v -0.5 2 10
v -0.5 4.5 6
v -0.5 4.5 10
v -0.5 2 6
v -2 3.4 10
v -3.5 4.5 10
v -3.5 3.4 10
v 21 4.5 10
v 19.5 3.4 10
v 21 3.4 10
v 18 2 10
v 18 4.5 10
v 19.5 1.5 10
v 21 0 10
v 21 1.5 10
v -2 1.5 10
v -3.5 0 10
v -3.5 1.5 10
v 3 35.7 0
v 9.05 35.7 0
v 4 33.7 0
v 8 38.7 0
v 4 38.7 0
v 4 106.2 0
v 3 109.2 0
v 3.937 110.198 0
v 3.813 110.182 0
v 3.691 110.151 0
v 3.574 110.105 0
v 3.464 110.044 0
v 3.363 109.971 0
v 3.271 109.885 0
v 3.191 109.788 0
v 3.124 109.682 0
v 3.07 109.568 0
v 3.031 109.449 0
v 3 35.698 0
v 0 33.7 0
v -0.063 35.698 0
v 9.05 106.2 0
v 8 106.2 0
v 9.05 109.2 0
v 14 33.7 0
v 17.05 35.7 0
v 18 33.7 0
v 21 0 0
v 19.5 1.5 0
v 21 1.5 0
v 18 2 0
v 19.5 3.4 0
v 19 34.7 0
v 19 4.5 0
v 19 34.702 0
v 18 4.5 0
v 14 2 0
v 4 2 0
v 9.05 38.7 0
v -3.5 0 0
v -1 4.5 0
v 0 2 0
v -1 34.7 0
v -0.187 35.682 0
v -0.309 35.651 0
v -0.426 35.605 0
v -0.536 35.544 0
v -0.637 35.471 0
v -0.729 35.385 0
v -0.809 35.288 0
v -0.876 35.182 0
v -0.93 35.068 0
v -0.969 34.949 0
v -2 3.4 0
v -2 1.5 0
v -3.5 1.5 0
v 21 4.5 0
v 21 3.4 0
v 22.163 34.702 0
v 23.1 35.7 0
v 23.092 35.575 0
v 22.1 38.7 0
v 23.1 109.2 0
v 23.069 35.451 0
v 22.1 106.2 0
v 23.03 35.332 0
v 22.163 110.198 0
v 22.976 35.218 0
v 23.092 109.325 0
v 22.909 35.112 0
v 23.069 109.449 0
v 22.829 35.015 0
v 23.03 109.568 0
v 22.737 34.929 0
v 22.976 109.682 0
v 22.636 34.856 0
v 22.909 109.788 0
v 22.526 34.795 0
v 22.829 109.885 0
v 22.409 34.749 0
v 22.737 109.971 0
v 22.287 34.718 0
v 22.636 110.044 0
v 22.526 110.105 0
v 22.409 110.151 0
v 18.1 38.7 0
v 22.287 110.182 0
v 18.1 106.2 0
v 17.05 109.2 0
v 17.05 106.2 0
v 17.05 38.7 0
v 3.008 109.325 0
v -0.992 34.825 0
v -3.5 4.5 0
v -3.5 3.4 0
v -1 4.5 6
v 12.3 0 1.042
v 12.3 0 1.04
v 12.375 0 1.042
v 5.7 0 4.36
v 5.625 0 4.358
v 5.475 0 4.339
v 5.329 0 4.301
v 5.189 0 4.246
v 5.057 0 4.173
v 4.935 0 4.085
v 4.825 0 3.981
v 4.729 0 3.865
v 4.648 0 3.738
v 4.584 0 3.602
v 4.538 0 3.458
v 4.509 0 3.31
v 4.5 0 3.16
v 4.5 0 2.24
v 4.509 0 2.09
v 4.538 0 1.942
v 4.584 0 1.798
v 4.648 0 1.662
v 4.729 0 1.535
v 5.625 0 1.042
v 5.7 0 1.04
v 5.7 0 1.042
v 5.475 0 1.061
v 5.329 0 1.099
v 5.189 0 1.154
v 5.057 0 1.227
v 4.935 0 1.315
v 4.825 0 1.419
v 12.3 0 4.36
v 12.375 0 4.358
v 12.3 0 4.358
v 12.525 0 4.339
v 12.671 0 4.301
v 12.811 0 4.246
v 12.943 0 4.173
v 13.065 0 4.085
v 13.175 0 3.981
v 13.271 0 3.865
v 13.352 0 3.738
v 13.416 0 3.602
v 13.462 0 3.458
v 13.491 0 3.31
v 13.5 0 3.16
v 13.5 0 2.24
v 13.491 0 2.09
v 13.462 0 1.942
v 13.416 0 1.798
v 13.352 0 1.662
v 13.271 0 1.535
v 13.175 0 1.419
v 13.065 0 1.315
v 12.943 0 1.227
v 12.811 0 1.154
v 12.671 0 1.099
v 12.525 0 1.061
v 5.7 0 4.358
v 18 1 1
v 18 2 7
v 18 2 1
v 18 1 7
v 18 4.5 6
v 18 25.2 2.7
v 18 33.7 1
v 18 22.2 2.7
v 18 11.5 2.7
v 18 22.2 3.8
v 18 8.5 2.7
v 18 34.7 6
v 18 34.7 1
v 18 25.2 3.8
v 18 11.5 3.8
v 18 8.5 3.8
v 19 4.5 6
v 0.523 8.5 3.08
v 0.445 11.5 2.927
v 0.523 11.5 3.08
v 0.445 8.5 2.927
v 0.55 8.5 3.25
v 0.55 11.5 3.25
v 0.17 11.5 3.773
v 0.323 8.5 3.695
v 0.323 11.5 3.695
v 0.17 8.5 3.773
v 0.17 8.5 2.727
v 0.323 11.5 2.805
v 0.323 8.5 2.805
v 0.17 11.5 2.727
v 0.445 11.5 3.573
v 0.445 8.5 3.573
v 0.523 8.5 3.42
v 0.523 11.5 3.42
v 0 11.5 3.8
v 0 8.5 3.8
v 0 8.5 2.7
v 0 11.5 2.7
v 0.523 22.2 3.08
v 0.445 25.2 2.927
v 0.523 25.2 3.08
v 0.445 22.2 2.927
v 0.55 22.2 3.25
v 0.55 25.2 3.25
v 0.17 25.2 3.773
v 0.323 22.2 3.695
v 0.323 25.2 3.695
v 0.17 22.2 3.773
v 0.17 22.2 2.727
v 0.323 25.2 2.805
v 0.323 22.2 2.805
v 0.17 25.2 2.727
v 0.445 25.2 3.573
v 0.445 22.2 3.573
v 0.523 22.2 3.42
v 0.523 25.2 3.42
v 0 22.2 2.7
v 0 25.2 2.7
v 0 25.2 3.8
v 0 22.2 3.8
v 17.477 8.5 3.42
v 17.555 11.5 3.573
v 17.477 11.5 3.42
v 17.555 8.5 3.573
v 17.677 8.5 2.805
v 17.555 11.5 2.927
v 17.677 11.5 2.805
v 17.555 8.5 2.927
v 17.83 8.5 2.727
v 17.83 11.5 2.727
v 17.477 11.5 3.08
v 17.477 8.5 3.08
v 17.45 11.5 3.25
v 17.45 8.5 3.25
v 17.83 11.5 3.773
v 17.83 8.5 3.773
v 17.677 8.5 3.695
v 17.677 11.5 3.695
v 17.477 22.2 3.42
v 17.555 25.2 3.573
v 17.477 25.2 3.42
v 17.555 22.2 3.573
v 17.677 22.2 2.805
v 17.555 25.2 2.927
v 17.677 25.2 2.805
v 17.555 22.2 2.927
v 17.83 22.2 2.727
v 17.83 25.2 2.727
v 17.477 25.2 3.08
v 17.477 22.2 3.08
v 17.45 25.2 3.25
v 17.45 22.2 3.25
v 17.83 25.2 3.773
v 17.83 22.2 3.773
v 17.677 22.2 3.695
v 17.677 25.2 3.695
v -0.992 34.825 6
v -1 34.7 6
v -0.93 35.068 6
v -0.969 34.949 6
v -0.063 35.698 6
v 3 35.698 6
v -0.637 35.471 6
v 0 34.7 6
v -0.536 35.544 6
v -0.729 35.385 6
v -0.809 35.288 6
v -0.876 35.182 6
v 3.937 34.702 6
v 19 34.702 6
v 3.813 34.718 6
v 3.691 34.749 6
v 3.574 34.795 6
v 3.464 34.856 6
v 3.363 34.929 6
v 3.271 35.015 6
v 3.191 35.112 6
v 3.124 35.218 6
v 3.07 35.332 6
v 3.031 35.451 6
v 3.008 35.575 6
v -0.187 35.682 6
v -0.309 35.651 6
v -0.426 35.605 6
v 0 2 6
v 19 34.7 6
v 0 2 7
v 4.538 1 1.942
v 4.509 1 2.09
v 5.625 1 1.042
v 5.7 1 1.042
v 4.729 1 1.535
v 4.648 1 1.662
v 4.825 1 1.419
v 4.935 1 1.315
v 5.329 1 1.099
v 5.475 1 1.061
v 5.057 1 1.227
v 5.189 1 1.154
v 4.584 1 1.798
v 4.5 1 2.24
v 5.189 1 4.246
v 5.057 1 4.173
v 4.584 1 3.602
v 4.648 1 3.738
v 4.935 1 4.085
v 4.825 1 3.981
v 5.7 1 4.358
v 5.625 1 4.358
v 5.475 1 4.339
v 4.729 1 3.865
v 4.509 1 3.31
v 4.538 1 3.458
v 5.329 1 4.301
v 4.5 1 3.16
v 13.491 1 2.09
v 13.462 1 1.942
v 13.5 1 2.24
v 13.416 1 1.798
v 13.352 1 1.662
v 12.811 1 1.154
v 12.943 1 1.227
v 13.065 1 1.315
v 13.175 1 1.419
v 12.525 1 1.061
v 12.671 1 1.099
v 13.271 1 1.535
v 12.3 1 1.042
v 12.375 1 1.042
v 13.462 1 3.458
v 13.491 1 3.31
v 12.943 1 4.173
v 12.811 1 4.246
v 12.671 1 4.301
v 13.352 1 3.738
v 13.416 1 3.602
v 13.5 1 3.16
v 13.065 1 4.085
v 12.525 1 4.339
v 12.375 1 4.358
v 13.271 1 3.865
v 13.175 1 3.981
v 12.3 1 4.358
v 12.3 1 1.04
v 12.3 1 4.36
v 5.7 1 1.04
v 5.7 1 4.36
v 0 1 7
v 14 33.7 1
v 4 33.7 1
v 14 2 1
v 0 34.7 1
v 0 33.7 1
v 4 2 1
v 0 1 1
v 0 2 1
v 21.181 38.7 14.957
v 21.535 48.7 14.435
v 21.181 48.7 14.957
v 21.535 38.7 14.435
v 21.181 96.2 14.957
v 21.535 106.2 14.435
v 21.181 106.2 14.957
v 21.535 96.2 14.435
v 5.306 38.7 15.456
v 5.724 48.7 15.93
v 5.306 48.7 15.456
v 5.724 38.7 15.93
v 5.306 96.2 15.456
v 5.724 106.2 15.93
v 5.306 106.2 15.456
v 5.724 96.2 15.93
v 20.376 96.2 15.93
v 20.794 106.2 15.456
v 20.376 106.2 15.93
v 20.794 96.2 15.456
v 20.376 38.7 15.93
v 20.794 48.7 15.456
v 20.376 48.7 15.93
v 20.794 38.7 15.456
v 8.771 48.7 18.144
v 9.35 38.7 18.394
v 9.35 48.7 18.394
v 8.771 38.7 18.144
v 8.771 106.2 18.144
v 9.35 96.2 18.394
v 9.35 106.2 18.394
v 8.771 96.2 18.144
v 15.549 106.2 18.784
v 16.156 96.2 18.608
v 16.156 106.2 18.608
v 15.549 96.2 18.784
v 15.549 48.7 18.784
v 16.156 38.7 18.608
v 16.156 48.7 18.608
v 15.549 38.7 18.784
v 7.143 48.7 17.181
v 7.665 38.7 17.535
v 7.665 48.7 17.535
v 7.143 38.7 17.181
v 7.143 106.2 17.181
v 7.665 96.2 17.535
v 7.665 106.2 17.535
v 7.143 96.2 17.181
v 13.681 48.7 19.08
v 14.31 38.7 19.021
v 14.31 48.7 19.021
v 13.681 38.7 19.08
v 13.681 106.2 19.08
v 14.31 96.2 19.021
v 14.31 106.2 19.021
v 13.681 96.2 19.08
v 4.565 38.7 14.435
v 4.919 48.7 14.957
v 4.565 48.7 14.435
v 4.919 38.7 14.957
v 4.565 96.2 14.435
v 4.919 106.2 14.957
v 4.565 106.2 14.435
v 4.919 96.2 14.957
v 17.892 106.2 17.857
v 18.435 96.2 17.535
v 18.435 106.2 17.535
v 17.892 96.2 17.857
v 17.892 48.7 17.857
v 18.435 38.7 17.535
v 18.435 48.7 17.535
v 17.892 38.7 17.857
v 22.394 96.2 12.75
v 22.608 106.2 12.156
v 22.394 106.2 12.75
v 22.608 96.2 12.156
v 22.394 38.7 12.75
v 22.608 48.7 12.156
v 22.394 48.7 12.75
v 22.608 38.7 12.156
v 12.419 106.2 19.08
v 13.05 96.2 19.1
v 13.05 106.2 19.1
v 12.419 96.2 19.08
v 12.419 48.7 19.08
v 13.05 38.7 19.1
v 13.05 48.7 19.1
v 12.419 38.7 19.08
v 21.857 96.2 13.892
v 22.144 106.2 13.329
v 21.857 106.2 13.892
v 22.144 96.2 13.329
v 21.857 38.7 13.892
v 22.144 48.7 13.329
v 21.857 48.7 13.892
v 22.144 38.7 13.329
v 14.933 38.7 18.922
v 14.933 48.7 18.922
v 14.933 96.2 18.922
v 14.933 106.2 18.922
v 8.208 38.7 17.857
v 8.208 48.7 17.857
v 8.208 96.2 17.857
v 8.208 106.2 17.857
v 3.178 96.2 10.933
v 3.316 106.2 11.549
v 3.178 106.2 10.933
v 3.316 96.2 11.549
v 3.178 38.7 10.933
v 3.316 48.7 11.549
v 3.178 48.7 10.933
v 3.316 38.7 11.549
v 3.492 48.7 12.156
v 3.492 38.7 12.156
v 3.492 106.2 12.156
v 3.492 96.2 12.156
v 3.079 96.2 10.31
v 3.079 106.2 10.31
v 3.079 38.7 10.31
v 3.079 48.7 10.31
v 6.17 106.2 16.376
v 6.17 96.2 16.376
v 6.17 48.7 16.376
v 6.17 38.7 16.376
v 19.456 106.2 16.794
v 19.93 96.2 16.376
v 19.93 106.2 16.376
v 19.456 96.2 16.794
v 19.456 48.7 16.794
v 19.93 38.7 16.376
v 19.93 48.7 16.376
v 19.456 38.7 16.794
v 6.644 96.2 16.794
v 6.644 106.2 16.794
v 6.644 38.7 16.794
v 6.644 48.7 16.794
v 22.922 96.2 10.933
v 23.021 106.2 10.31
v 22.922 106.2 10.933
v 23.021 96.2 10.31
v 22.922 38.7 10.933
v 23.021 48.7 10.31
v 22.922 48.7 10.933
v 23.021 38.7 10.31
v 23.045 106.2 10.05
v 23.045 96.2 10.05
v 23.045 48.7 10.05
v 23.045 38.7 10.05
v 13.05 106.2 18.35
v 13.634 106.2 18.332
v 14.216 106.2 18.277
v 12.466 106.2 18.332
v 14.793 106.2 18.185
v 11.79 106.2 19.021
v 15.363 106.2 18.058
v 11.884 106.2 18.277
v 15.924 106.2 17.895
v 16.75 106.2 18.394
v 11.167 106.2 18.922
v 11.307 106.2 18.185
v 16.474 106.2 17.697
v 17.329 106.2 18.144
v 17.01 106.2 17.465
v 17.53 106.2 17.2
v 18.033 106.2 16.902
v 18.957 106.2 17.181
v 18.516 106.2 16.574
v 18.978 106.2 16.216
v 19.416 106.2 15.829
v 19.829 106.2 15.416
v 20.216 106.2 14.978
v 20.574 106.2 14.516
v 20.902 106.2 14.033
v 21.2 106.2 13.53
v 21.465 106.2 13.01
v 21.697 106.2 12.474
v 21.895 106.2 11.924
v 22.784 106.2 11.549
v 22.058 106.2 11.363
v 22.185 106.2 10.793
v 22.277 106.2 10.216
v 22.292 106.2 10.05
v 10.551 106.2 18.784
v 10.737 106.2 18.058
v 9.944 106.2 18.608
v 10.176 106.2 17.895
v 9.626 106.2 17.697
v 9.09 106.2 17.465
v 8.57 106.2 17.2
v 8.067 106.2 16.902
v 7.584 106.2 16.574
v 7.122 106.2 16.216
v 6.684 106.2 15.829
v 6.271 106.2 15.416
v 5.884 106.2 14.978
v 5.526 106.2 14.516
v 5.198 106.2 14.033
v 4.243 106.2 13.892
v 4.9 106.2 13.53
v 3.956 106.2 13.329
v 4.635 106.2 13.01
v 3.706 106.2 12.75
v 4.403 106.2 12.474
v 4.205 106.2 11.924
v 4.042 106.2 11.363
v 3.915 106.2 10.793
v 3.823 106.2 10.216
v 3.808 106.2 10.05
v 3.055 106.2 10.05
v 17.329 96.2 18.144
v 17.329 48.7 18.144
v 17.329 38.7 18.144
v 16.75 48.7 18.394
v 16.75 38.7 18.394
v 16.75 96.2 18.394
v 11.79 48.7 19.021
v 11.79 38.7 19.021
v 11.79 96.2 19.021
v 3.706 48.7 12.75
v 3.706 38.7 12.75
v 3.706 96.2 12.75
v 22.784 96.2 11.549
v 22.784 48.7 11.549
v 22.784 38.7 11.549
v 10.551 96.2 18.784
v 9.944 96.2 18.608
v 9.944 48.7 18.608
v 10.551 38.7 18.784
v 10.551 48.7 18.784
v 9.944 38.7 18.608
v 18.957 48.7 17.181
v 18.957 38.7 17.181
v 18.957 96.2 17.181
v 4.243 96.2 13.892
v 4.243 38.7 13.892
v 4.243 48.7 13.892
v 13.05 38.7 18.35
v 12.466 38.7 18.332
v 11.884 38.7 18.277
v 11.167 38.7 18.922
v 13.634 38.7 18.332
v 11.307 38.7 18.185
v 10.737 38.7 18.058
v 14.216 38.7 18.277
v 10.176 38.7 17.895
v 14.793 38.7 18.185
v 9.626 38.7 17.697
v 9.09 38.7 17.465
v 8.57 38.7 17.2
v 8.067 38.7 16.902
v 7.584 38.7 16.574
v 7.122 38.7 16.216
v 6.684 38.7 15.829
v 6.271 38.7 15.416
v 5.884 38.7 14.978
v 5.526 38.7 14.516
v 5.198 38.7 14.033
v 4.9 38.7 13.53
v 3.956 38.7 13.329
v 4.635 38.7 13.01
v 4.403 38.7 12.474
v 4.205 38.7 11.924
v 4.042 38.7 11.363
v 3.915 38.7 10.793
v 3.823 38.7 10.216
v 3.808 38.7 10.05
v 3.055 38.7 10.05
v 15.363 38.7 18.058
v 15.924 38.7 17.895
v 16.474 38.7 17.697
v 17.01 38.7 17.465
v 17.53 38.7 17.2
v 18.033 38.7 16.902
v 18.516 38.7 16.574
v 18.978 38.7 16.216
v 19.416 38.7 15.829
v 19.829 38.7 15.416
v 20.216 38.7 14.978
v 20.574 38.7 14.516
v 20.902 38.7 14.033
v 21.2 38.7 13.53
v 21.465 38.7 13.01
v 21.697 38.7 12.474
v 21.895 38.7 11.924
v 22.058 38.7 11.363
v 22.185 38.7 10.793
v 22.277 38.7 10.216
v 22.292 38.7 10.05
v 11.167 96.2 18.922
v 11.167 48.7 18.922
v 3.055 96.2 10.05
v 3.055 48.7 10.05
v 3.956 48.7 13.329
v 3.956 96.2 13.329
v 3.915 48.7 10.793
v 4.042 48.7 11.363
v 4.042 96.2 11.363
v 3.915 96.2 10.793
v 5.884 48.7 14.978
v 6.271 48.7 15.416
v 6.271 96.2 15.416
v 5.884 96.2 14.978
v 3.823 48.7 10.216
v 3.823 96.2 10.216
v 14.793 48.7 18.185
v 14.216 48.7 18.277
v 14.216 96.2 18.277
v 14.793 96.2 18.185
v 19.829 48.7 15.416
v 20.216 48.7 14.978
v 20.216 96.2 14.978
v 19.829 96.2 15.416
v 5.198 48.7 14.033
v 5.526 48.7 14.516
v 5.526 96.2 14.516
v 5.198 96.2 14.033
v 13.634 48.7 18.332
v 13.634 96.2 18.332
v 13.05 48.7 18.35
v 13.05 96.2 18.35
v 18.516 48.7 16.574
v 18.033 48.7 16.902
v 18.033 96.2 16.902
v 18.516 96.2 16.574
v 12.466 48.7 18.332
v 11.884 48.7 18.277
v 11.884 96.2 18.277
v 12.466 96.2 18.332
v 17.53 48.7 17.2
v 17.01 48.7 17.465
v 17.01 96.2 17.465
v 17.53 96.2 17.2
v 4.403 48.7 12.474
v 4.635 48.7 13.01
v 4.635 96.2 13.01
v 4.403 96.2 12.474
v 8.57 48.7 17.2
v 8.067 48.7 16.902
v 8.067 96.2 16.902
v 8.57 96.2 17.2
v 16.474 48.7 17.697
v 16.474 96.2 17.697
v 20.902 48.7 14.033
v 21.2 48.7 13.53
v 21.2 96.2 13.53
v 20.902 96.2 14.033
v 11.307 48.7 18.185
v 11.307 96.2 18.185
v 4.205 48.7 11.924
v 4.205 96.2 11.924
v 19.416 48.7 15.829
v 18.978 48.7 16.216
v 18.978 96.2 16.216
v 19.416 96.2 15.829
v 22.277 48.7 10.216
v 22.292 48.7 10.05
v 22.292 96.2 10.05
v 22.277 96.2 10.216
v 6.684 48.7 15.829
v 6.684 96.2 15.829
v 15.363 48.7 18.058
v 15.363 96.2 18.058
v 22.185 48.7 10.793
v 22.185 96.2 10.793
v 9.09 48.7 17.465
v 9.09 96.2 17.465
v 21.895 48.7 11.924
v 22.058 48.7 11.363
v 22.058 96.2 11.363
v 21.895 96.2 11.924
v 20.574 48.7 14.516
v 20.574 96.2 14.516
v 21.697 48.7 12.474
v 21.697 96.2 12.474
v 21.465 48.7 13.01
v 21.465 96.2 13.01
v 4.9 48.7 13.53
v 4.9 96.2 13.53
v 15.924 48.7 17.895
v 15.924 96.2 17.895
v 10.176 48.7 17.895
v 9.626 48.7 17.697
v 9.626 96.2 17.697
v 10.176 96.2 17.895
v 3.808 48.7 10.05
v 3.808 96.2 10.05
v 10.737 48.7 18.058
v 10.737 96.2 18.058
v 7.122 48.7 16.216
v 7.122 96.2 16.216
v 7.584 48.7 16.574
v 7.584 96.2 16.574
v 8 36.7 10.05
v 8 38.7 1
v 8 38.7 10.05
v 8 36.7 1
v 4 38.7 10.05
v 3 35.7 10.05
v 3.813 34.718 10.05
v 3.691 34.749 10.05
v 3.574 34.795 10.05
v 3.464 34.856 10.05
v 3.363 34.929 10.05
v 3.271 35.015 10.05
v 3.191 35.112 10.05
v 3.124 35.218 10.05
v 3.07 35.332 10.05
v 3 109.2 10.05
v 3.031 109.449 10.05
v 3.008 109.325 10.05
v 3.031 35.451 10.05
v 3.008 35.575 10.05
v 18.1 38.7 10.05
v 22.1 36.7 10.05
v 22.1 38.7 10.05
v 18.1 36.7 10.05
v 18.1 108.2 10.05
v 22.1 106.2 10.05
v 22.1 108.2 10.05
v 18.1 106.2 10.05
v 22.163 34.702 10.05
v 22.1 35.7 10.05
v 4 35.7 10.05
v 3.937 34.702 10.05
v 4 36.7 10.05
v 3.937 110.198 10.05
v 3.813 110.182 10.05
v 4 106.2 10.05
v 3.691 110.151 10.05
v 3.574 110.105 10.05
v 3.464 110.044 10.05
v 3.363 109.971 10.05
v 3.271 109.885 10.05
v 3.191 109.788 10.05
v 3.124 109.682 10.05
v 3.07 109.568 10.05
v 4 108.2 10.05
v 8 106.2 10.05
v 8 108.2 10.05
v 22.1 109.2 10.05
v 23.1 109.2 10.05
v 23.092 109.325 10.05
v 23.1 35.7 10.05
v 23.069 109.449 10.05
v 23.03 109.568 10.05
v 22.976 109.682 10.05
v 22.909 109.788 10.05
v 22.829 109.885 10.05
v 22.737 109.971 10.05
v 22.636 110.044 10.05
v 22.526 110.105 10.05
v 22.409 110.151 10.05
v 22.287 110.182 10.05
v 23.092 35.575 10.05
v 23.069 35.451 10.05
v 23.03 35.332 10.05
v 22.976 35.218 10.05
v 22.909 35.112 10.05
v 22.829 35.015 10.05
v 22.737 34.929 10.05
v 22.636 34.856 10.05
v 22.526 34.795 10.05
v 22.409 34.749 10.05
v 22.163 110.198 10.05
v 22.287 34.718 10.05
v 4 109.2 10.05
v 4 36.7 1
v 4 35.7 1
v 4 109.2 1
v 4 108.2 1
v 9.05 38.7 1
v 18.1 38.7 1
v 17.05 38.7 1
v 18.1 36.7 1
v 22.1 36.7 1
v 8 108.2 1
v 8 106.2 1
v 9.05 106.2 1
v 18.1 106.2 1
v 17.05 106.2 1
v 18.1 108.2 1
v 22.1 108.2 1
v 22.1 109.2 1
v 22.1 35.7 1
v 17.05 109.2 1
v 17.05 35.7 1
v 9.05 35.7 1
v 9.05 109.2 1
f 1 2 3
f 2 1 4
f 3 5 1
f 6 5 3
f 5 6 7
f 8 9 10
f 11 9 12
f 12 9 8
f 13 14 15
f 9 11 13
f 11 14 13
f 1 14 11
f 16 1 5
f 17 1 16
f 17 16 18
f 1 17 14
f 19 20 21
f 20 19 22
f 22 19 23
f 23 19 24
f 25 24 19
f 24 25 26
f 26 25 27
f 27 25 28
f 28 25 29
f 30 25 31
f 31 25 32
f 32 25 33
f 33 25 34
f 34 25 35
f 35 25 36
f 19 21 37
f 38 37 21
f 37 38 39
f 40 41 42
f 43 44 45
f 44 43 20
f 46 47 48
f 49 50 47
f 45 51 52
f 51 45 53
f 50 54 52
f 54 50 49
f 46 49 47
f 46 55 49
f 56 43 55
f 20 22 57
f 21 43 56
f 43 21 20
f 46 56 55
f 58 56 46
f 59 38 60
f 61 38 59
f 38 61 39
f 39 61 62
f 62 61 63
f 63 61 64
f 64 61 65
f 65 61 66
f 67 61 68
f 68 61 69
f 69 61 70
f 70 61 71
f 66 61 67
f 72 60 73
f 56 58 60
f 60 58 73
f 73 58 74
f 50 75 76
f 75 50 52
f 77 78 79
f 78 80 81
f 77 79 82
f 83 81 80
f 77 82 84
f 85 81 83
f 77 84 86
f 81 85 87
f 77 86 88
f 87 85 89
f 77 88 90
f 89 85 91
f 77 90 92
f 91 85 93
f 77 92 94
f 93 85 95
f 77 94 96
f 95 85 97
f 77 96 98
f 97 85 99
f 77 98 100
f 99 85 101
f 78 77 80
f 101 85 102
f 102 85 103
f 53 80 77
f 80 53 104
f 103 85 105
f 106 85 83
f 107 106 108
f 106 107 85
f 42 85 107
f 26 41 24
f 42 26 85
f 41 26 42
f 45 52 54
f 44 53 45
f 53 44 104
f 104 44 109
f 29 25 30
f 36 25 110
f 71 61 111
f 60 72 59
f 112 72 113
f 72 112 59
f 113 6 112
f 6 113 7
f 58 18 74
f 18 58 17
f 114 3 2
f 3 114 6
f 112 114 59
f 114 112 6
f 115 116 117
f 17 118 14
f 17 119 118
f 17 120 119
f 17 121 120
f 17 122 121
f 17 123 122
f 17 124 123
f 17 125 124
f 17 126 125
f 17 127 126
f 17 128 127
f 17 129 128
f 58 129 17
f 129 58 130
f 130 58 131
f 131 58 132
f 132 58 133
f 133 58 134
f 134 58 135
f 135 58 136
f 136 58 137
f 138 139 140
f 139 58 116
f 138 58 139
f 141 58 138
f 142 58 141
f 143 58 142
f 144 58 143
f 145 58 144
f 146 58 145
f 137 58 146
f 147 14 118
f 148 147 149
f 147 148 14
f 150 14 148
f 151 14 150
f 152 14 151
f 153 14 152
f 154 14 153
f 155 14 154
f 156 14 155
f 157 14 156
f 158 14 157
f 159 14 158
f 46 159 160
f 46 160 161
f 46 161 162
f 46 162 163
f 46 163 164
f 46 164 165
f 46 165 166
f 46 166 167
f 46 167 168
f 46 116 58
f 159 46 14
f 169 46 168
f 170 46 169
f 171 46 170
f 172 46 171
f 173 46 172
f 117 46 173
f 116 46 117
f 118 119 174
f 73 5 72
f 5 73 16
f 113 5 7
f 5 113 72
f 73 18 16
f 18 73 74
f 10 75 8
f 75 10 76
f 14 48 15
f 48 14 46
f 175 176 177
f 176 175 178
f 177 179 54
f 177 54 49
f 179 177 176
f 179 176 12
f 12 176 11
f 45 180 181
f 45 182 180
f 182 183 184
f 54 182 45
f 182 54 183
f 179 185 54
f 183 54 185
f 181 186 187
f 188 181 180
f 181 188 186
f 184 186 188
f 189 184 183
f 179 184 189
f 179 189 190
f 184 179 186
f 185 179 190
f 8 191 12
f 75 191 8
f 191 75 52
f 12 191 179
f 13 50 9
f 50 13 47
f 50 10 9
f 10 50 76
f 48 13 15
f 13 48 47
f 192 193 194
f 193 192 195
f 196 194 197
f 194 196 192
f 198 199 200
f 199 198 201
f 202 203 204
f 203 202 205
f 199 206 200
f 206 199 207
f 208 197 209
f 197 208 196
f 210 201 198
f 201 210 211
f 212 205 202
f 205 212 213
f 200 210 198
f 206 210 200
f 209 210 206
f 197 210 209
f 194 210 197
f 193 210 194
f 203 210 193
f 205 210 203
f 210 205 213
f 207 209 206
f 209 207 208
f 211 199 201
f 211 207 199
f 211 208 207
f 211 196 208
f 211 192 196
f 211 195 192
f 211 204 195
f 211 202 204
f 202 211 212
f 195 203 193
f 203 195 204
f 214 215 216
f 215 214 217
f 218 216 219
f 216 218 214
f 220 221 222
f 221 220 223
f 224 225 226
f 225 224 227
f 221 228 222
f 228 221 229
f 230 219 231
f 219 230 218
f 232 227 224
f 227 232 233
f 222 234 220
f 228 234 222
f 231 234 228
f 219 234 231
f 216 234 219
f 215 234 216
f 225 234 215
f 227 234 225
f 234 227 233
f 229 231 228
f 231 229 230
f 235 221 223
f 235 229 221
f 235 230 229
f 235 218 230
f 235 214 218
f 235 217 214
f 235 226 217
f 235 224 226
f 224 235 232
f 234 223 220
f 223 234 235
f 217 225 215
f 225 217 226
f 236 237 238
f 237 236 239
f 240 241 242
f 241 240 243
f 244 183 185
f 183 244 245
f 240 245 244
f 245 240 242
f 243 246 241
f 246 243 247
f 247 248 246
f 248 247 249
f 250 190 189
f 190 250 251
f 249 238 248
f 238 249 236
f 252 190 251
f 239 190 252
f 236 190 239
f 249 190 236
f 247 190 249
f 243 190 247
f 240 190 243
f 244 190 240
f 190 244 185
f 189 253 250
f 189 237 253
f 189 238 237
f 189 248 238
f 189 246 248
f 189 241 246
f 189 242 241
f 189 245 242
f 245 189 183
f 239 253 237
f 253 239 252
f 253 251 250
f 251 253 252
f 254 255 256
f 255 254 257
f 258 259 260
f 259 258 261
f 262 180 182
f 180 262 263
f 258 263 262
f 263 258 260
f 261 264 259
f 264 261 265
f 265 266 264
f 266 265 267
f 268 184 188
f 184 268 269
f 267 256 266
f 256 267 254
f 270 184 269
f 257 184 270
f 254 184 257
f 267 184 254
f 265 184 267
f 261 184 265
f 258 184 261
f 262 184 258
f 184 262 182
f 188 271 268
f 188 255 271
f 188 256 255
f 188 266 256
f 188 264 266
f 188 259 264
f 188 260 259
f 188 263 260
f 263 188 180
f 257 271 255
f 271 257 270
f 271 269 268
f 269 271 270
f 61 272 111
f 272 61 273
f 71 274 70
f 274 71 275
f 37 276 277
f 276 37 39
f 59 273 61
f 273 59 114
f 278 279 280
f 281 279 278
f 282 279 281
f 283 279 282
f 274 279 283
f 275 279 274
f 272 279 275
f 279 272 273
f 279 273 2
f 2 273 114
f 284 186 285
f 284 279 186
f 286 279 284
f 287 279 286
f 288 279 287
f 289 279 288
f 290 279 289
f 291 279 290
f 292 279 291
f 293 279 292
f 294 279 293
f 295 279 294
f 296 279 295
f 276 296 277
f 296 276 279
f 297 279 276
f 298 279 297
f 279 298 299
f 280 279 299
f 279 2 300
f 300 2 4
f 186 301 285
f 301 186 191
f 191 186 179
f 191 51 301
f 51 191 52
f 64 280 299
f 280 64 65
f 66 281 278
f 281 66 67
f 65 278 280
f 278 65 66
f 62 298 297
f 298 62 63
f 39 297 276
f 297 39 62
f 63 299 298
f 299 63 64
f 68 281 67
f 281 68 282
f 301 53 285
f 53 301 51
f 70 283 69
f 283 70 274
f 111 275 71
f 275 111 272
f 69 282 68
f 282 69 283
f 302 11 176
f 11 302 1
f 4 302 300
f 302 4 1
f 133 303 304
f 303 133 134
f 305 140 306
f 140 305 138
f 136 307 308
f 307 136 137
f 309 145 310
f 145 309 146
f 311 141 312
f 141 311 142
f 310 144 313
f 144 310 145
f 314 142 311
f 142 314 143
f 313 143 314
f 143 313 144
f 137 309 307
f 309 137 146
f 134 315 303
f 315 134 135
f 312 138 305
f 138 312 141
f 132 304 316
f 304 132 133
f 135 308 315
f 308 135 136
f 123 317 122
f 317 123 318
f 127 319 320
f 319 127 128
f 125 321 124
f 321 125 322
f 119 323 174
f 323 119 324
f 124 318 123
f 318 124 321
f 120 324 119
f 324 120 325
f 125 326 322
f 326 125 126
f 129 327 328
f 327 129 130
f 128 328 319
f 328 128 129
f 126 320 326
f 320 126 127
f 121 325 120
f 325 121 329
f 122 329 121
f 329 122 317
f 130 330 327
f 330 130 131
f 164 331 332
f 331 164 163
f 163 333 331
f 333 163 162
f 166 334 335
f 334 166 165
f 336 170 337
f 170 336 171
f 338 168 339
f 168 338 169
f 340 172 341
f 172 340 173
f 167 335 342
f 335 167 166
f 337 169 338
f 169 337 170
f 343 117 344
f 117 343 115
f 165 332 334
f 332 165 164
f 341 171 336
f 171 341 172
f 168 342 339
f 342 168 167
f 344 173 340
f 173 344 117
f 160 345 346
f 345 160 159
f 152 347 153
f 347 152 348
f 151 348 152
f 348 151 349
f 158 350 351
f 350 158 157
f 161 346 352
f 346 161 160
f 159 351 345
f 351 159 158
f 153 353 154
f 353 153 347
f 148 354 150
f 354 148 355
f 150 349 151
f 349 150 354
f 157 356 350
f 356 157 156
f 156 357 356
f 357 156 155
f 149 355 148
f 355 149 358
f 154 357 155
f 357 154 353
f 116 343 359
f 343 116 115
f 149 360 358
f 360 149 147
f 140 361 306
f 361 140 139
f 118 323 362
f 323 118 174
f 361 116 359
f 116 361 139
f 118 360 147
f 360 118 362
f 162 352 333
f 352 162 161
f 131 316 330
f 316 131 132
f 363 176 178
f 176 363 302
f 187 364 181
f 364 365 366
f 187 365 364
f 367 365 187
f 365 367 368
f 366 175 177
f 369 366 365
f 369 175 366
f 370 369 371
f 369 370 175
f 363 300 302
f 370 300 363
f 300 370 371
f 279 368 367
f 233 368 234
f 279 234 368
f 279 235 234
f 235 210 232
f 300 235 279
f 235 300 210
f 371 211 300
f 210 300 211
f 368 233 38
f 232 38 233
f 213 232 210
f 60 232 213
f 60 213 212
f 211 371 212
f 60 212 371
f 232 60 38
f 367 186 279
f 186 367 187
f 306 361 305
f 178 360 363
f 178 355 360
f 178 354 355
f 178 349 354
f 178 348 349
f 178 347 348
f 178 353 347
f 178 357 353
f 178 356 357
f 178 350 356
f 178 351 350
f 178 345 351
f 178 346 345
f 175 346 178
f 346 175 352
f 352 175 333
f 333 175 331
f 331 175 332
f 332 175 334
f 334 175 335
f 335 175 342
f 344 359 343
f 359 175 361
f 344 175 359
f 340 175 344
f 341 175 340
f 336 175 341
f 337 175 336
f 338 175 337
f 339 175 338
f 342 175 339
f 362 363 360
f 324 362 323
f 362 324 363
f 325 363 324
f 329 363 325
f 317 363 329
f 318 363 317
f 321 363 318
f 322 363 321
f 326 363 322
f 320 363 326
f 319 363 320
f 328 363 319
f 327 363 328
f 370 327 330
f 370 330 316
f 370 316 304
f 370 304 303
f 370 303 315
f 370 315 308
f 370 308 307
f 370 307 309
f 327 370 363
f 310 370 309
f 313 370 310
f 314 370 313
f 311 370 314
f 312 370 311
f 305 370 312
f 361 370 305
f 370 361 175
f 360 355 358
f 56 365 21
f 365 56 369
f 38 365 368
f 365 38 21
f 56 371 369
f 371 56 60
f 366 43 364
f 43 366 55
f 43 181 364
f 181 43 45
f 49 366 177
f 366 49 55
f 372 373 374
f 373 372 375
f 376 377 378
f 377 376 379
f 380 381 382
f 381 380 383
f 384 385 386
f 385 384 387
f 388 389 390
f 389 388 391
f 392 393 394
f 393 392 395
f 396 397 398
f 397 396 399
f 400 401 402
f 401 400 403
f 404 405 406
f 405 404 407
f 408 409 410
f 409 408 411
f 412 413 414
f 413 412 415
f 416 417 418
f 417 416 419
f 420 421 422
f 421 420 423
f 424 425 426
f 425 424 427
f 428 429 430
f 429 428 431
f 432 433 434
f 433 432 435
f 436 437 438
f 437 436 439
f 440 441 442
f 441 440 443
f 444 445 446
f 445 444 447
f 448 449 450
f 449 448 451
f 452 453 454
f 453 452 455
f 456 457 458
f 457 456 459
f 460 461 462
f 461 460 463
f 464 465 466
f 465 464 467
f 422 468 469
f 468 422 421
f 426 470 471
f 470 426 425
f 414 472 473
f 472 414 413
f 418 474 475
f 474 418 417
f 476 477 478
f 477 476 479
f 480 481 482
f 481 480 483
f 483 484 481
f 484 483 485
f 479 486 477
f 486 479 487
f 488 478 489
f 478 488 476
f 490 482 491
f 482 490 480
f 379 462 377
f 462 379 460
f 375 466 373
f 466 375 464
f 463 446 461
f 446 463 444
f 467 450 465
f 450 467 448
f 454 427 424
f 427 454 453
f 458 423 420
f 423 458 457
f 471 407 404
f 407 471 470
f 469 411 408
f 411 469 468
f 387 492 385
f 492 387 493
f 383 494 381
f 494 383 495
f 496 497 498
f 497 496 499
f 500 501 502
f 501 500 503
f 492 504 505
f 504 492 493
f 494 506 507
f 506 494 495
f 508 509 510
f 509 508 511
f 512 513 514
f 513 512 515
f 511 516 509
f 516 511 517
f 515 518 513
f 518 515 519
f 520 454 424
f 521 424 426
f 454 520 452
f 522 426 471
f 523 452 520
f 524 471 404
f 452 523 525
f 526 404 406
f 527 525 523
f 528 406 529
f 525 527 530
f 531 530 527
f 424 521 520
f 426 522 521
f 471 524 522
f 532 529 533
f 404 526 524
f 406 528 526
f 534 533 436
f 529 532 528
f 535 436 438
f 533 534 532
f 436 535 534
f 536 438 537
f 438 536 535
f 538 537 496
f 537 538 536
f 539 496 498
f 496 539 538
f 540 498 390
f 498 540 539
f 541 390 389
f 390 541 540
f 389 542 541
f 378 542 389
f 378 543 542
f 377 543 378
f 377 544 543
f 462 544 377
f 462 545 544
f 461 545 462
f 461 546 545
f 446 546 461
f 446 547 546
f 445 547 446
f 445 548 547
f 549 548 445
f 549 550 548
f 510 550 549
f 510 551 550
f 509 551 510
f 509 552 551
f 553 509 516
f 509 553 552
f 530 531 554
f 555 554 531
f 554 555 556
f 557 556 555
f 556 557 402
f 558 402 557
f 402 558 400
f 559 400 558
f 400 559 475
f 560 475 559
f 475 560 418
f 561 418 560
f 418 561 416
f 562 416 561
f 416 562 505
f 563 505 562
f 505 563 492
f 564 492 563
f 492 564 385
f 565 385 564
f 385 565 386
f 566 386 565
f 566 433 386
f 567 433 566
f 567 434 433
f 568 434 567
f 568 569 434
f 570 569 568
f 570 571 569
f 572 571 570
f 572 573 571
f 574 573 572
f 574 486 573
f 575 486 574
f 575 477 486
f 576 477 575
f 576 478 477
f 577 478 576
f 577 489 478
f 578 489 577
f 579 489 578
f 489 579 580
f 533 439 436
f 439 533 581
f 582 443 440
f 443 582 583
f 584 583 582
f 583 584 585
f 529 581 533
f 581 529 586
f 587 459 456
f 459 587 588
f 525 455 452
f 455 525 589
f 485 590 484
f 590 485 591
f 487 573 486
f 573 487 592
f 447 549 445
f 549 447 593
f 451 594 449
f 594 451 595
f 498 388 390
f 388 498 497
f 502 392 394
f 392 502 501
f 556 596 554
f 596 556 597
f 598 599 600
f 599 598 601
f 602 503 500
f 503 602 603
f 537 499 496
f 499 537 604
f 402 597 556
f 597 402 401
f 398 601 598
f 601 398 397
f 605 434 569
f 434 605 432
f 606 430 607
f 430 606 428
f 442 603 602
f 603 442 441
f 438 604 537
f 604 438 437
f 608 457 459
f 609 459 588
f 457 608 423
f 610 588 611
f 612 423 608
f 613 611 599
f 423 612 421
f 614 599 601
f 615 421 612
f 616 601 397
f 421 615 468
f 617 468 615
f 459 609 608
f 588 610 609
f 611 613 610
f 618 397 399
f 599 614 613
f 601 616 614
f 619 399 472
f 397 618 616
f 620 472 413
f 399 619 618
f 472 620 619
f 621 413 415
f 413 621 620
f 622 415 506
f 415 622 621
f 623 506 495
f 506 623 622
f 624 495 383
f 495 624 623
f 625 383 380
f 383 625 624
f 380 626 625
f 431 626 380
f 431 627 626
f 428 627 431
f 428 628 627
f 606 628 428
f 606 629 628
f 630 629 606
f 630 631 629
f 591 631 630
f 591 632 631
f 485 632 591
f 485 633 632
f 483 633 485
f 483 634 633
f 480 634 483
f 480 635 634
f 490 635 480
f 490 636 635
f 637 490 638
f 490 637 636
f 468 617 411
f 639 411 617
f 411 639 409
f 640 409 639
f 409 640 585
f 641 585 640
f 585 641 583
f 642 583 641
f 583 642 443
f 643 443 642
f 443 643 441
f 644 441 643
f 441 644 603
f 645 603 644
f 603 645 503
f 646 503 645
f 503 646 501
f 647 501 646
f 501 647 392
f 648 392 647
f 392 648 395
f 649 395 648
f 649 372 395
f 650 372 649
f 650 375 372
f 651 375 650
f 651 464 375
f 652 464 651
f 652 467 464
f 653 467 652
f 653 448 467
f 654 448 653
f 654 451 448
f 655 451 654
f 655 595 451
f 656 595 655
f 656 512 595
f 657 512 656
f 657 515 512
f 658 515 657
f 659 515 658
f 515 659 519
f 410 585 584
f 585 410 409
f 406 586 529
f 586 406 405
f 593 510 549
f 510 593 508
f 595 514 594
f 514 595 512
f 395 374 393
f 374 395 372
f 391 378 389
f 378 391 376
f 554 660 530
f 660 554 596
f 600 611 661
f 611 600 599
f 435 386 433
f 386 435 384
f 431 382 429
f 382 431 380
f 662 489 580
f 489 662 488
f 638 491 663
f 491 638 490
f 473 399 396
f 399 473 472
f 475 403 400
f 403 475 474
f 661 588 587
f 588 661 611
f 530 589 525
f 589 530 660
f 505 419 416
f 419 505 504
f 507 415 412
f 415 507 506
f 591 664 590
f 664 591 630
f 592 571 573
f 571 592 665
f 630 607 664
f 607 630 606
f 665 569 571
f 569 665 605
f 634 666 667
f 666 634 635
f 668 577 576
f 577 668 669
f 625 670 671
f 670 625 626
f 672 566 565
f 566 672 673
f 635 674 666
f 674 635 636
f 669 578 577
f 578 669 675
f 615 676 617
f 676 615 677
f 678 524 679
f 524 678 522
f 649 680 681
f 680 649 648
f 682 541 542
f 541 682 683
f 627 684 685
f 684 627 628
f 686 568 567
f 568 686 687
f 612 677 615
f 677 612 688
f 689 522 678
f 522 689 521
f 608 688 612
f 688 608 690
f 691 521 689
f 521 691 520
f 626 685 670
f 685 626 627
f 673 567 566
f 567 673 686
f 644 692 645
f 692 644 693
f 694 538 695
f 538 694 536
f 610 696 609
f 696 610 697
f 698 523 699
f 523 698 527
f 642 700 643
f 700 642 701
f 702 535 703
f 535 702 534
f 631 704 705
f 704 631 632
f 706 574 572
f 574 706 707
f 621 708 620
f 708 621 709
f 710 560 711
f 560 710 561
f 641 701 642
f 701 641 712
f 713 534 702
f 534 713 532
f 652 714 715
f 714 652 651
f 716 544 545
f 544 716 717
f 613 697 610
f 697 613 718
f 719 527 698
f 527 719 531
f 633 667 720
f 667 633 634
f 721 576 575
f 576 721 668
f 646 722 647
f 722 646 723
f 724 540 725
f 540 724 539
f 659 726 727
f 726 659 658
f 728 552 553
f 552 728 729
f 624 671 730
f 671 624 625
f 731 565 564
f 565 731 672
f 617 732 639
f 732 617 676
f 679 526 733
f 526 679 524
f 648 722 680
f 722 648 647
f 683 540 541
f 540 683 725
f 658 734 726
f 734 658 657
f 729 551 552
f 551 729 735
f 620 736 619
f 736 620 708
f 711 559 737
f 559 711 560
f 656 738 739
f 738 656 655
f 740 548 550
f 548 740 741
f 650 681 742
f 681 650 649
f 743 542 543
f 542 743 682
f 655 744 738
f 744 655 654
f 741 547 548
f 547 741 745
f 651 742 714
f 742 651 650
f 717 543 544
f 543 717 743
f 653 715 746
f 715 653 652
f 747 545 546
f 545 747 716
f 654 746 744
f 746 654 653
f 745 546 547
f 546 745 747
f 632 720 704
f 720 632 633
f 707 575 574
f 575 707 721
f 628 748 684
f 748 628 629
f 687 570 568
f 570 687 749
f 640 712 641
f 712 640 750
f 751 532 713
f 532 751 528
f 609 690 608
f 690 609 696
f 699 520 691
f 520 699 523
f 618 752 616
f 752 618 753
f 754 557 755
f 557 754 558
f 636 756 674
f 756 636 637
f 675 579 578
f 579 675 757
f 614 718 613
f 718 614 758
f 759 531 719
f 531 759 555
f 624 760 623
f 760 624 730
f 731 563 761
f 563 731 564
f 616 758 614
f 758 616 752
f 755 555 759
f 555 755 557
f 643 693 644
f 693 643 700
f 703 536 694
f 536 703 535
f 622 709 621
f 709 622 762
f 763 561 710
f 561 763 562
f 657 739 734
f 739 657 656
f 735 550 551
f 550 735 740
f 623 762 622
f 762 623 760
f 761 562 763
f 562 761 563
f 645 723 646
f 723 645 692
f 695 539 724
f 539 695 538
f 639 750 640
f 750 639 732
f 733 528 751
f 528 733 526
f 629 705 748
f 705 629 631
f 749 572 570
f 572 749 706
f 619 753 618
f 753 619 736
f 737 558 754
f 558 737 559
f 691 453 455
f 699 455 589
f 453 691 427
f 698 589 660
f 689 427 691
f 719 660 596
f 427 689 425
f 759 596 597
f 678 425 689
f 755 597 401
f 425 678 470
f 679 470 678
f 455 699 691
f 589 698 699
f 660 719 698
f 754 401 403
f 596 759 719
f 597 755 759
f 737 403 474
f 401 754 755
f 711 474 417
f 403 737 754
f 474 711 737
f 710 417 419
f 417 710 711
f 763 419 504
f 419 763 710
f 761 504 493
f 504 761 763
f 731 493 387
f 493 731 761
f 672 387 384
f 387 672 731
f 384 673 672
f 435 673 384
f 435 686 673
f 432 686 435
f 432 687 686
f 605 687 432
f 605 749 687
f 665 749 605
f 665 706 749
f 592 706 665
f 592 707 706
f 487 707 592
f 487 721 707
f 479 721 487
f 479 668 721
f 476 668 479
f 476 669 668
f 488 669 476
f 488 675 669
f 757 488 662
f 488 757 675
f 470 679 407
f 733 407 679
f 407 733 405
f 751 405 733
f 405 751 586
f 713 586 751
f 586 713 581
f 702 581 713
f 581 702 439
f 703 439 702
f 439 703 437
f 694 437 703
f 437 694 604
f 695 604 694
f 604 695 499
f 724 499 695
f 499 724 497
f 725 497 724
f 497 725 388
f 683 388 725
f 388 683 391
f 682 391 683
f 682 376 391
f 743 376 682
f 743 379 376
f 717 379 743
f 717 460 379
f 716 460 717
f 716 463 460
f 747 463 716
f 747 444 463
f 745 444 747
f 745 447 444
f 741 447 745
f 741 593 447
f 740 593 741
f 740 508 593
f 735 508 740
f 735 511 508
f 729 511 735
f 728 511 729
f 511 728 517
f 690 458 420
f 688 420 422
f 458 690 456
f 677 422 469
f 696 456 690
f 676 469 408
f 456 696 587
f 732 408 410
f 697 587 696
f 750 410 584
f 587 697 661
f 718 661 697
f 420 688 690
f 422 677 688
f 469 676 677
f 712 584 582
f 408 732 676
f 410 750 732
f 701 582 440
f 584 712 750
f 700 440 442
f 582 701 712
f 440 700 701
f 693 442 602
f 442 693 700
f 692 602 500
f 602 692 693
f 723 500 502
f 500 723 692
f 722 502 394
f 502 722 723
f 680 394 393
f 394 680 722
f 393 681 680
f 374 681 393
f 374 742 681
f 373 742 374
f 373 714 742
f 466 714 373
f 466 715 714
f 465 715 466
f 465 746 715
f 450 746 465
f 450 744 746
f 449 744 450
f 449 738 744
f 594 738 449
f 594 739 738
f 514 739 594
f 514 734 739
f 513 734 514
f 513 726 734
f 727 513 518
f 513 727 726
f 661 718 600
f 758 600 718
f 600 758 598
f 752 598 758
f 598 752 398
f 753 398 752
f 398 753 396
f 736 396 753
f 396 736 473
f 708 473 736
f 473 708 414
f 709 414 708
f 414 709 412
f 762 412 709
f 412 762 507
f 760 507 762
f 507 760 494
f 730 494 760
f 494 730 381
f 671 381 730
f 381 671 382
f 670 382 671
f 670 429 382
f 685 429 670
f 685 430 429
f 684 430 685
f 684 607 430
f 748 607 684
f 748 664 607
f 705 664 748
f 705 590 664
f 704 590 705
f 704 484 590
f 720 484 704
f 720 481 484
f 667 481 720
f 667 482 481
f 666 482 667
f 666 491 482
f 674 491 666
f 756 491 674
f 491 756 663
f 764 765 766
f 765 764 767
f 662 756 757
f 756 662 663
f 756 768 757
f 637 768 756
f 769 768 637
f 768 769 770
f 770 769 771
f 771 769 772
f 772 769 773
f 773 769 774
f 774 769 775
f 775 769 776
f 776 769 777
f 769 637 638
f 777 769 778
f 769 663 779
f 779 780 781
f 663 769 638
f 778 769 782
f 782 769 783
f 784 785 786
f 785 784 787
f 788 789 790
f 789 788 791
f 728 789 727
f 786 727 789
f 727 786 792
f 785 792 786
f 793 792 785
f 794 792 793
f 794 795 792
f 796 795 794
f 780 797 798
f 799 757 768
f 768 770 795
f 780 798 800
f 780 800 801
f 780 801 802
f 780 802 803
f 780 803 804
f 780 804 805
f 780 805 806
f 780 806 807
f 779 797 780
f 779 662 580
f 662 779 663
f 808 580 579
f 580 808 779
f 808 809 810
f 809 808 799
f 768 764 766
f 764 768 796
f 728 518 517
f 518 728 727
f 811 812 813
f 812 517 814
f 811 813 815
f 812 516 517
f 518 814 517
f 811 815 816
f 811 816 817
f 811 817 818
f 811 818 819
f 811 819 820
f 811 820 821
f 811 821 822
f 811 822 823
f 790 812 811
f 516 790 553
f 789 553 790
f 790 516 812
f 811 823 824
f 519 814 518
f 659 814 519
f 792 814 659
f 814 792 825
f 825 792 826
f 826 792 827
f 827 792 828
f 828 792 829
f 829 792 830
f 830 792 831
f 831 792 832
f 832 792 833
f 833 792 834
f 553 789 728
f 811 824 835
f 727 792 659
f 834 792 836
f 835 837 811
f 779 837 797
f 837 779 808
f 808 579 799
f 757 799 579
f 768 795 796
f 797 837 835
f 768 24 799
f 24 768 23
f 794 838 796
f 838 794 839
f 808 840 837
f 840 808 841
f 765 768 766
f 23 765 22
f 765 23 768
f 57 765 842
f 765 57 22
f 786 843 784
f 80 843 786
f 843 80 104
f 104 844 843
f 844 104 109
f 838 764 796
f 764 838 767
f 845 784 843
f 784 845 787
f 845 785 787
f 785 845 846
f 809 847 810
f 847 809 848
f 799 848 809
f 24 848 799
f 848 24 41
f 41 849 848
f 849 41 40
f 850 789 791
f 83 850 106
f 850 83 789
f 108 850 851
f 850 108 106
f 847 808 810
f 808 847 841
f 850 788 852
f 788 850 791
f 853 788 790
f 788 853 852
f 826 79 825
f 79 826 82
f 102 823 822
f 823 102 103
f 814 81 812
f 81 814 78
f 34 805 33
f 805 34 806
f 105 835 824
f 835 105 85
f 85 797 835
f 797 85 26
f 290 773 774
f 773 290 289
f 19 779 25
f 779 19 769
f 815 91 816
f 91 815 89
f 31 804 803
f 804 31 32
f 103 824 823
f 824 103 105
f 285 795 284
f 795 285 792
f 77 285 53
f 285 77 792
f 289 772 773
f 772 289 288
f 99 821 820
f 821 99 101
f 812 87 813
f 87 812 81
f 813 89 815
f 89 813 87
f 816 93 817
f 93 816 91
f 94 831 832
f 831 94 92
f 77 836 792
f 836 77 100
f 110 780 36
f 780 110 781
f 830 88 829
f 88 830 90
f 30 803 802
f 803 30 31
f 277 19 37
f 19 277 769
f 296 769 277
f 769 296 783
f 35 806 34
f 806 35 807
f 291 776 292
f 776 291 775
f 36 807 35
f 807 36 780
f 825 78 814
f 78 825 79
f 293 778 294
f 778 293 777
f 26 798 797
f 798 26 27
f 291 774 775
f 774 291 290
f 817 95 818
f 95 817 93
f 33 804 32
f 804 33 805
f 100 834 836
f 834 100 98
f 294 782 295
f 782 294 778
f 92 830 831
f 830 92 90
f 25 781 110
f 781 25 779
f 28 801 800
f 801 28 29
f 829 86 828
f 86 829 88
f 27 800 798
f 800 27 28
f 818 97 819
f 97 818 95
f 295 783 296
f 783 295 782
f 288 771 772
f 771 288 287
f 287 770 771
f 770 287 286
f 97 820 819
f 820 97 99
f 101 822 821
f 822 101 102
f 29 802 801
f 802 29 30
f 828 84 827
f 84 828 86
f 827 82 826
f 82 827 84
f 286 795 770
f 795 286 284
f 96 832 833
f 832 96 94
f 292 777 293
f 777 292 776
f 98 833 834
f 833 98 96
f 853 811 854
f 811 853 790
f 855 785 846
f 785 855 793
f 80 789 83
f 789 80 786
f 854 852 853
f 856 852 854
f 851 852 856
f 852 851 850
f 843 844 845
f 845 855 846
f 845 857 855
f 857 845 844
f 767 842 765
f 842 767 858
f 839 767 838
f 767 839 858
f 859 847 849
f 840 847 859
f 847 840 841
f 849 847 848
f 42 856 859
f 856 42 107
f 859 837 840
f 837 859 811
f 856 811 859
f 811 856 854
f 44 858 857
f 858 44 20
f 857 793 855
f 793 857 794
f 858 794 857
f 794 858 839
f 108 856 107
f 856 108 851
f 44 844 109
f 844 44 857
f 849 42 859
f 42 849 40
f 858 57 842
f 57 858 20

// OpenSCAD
// microcontroller dimension

// nice!nano 
controllerWidth = 18;
controllerLen = 33.7;
controllerHeight = 1.7;


isExternalResetButtonEnabled = false;

buttonAdditionalHeight = 4.5;
controllerBoxHeight = 6;
controllerTopFaceHeight = 10;
controllerWallWidth = 1;
controllerBottomHeight = 1;
controllerHolderCylinderDiameter = 1.1;

//usb hole
usbHoleTopOffset = 0;
usbHoleHeight = 3.32;
usbConnectorWidth = 9;
usbOffset = 0.8;
//
controllerWiringHoleWidth = 4;
roundCornerHeight = 1;
roundCornerRadius = 1;
contactsWidth = 1;
contactsWallWdth = 2;

//bracing
bracingWidth = 1.5;
bracingLen = 1.9;

bracingOuterSize = bracingWidth*2*2 + controllerWidth + roundCornerRadius;//31.366; //32.5
echo(bracingOuterSize);

//button
buttonDiameter = 3;
buttonClickDiameter = 1.6;
buttonHeight = 5.2;
buttonWidth = 6;
buttonDepth = 1.5;
 
boxHeight = controllerBoxHeight; 
if (isExternalResetButtonEnabled) {
    boxHeight = boxHeight + buttonAdditionalHeight;
}

batteryLen = 67.5; 
batteryDiameter = 18.1;
batteryBoxHeight = batteryDiameter/2 + controllerBottomHeight;

isTmp = false;
//controllerLen = 8;

module usbHole() {
    width = usbConnectorWidth;
    radius = 1.2;
    height = usbHoleHeight;
    verticalDelta = height/2 - radius;
    holeDepth = usbOffset + controllerWallWidth;
    cubeWidth = width - radius * 2;
    
    translate([radius, 0, 0]) rotate([-90,0,00]) {
        translate([0, verticalDelta, 0]) cylinder(holeDepth, radius, radius, $fn=50);
        translate([0, -verticalDelta, 0]) cylinder(holeDepth, radius, radius, $fn=50);
        
        translate([cubeWidth, verticalDelta, 0]) cylinder(holeDepth, radius, radius, $fn=50);
        translate([cubeWidth, -verticalDelta, 0]) cylinder(holeDepth, radius, radius, $fn=50);
        
        // vert
        translate([0, -height/2 ,0]) cube([cubeWidth, height, holeDepth]);
        //hor
        translate([- radius, -height/2 + radius,0]) cube([width, height - radius*2, holeDepth]);
    }
}

module controllerHolderHelper() {
     offset = 10;
     translate([0,0,controllerHeight + + controllerBottomHeight + controllerHolderCylinderDiameter/2]){
                 translate([0, offset, 0]) rotate([-90,0,00]) { cylinder(h = 3, d = controllerHolderCylinderDiameter, center = true, $fn=20);}
                 translate([0, controllerLen - offset, 0]) rotate([-90,0,00]) { cylinder(h = 3, d = controllerHolderCylinderDiameter, center = true, $fn=20);}
                 
                 
                  translate([controllerWidth, offset, 0]) rotate([-90,0,00]) { cylinder(h = 3, d = controllerHolderCylinderDiameter, center = true, $fn=20);}
                 translate([controllerWidth, controllerLen - offset, 0]) rotate([-90,0,00]) { cylinder(h = 3, d = controllerHolderCylinderDiameter, center = true, $fn=20);}
        }    
}

module controllerBox() {
    // microcontroller holder
    union() {
        bracingTotalWidth = bracingWidth * 3;
        bracingLeft();
        bracingRight();
        
        
        controllerHolderHelper();
        
        difference() {
            union(){
                translate([0, roundCornerRadius, 0]){
                    minkowski() {
                        cube([controllerWidth,  controllerLen, controllerBoxHeight - roundCornerHeight]);
                        cylinder(roundCornerHeight, roundCornerRadius, roundCornerRadius, $fn=50);
                    }
                }
              
               //front wall
               translate([- (bracingOuterSize - controllerWidth - roundCornerRadius*2 - bracingWidth*3) , 0, 0]){
                    
                    cube([bracingOuterSize - 2 * bracingWidth*2, controllerWallWidth * 2, controllerTopFaceHeight]);
                    
                }
            }
            // Microcontroller hole
            translate([0, roundCornerRadius, controllerBottomHeight]) cube([controllerWidth,  controllerLen, boxHeight]);
            
            holesFaceOffset = 2;
            // Right wiring hole
            translate([0, holesFaceOffset, -0.5 ]) cube([controllerWiringHoleWidth, controllerLen -holesFaceOffset, controllerBottomHeight + 0.5]);
            
            // Left wiring hole
            translate([controllerWidth - controllerWiringHoleWidth, holesFaceOffset, -0.5 ]) cube([controllerWiringHoleWidth, controllerLen - holesFaceOffset, controllerBottomHeight + 0.5]);
            
            usbConnectorLeftOffset = controllerWidth / 2 - usbConnectorWidth / 2;
            translate([usbConnectorLeftOffset, 0, usbHoleTopOffset + controllerBottomHeight + controllerHeight]) usbHole();
        }
    }
}

module bracingLeft() {
    width = bracingWidth*3;
    translate([- (bracingOuterSize - controllerWidth - roundCornerRadius*2 -bracingWidth) , 0, 0]){
    //translate([- bracingWidth *2, 0 , 0]) {
        difference() {
            cube([bracingWidth *2, bracingWidth*3, controllerTopFaceHeight]);
             translate([0, bracingWidth, 0])
            cube([bracingWidth, bracingLen, controllerTopFaceHeight]);
        }
        
    
    }
}

module bracingRight() {
   
    translate([controllerWidth, 0, 0]) {
        difference() {
            cube([bracingWidth *2, bracingWidth*3, controllerTopFaceHeight]);
            translate([bracingWidth, bracingWidth, 0])
            cube([bracingWidth, bracingLen, controllerTopFaceHeight]);
        }
    }
}

module batteryContactsHolder() {
    width = 4;
    height = batteryBoxHeight;
    depth = contactsWallWdth + contactsWidth;
    union() {
        difference(){
            cube([width, depth, height]);
            translate([0, 0, 0]) {
                cube([width , contactsWidth, height]);
                }
        }
        
        translate([batteryDiameter - width, 0 ,0 ]){ 
            difference(){
                cube([width, depth, height]);
                translate([0, 0, 0]) {
                    cube([width , contactsWidth, height]);
                }
            }
        }
    }
}

module batteryBox() {
    translate([0, controllerLen + roundCornerRadius, 0]) {     
        union() {
            // top
           
                
            translate([batteryDiameter/2, roundCornerRadius + (contactsWallWdth + contactsWidth), batteryDiameter/2]){
                difference() {
                    batteryCoverDiameter = batteryDiameter + controllerWallWidth+1;
                    rotate([-90,0,0]) cylinder(d=batteryCoverDiameter, h=batteryLen, $fn=100);
                    
                    
                    rotate([-90,0,0]) cylinder(d=batteryDiameter + 0.5, h=batteryLen + 1, $fn=100);
                    
                    translate([-batteryCoverDiameter/2, 0, -batteryCoverDiameter/2]){
                        cube([batteryCoverDiameter, batteryLen, batteryCoverDiameter/2]);
                    }
                    
                    topHoleLen = batteryLen - 20;
                    translate([-batteryCoverDiameter/2, (batteryLen - topHoleLen)/2, 0]){
                        cube([batteryCoverDiameter, topHoleLen, batteryCoverDiameter/2]);
                    }
                    
                }
            }
            
            //contacts 1
            translate([0, contactsWidth, 0]){
                batteryContactsHolder();
            }

            // contacts 2
            translate([0, batteryLen + 2 * (contactsWallWdth + contactsWidth) + roundCornerRadius, 0]){
                mirror([0,1,0]) batteryContactsHolder();
            }
            
            //battery
            if (isTmp){
                translate([batteryDiameter/2, roundCornerRadius + (contactsWallWdth + contactsWidth), batteryDiameter/2 + controllerBottomHeight]){
                    color("red") {
                        rotate([-90,0,0]) cylinder(d=batteryDiameter, h=batteryLen);
                    }
                }
            }

            difference(){  
                union(){
                    translate([0, roundCornerRadius, 0]){
                        minkowski() {
                            cube([batteryDiameter,  batteryLen + 2 * (contactsWallWdth + contactsWidth), batteryBoxHeight - roundCornerHeight]);
                                cylinder(roundCornerHeight, roundCornerRadius, roundCornerRadius, $fn=50);
                            }
                        }
                }
                
                // battery hole
               
                translate([0, roundCornerRadius, controllerBottomHeight]) {
                    cube([batteryDiameter,  batteryLen + 2 * (contactsWallWdth + contactsWidth), batteryBoxHeight]);
                }
                
                holesFaceOffset = contactsWallWdth + contactsWidth;
                 // wide hole
                translate([0, roundCornerRadius + holesFaceOffset, -0.5 ]) cube([batteryDiameter, batteryLen , controllerBottomHeight + 0.5]);
                
                centerHoleWidth = 8;
                // center hole
                translate([batteryDiameter/2 - centerHoleWidth/2, roundCornerRadius , -0.5 ]) cube([centerHoleWidth, batteryLen + 2*holesFaceOffset, controllerBottomHeight + 0.5]);
                
            }
        }
    }
}

controllerBox();
translate([4,0,0]) {
batteryBox();
}
